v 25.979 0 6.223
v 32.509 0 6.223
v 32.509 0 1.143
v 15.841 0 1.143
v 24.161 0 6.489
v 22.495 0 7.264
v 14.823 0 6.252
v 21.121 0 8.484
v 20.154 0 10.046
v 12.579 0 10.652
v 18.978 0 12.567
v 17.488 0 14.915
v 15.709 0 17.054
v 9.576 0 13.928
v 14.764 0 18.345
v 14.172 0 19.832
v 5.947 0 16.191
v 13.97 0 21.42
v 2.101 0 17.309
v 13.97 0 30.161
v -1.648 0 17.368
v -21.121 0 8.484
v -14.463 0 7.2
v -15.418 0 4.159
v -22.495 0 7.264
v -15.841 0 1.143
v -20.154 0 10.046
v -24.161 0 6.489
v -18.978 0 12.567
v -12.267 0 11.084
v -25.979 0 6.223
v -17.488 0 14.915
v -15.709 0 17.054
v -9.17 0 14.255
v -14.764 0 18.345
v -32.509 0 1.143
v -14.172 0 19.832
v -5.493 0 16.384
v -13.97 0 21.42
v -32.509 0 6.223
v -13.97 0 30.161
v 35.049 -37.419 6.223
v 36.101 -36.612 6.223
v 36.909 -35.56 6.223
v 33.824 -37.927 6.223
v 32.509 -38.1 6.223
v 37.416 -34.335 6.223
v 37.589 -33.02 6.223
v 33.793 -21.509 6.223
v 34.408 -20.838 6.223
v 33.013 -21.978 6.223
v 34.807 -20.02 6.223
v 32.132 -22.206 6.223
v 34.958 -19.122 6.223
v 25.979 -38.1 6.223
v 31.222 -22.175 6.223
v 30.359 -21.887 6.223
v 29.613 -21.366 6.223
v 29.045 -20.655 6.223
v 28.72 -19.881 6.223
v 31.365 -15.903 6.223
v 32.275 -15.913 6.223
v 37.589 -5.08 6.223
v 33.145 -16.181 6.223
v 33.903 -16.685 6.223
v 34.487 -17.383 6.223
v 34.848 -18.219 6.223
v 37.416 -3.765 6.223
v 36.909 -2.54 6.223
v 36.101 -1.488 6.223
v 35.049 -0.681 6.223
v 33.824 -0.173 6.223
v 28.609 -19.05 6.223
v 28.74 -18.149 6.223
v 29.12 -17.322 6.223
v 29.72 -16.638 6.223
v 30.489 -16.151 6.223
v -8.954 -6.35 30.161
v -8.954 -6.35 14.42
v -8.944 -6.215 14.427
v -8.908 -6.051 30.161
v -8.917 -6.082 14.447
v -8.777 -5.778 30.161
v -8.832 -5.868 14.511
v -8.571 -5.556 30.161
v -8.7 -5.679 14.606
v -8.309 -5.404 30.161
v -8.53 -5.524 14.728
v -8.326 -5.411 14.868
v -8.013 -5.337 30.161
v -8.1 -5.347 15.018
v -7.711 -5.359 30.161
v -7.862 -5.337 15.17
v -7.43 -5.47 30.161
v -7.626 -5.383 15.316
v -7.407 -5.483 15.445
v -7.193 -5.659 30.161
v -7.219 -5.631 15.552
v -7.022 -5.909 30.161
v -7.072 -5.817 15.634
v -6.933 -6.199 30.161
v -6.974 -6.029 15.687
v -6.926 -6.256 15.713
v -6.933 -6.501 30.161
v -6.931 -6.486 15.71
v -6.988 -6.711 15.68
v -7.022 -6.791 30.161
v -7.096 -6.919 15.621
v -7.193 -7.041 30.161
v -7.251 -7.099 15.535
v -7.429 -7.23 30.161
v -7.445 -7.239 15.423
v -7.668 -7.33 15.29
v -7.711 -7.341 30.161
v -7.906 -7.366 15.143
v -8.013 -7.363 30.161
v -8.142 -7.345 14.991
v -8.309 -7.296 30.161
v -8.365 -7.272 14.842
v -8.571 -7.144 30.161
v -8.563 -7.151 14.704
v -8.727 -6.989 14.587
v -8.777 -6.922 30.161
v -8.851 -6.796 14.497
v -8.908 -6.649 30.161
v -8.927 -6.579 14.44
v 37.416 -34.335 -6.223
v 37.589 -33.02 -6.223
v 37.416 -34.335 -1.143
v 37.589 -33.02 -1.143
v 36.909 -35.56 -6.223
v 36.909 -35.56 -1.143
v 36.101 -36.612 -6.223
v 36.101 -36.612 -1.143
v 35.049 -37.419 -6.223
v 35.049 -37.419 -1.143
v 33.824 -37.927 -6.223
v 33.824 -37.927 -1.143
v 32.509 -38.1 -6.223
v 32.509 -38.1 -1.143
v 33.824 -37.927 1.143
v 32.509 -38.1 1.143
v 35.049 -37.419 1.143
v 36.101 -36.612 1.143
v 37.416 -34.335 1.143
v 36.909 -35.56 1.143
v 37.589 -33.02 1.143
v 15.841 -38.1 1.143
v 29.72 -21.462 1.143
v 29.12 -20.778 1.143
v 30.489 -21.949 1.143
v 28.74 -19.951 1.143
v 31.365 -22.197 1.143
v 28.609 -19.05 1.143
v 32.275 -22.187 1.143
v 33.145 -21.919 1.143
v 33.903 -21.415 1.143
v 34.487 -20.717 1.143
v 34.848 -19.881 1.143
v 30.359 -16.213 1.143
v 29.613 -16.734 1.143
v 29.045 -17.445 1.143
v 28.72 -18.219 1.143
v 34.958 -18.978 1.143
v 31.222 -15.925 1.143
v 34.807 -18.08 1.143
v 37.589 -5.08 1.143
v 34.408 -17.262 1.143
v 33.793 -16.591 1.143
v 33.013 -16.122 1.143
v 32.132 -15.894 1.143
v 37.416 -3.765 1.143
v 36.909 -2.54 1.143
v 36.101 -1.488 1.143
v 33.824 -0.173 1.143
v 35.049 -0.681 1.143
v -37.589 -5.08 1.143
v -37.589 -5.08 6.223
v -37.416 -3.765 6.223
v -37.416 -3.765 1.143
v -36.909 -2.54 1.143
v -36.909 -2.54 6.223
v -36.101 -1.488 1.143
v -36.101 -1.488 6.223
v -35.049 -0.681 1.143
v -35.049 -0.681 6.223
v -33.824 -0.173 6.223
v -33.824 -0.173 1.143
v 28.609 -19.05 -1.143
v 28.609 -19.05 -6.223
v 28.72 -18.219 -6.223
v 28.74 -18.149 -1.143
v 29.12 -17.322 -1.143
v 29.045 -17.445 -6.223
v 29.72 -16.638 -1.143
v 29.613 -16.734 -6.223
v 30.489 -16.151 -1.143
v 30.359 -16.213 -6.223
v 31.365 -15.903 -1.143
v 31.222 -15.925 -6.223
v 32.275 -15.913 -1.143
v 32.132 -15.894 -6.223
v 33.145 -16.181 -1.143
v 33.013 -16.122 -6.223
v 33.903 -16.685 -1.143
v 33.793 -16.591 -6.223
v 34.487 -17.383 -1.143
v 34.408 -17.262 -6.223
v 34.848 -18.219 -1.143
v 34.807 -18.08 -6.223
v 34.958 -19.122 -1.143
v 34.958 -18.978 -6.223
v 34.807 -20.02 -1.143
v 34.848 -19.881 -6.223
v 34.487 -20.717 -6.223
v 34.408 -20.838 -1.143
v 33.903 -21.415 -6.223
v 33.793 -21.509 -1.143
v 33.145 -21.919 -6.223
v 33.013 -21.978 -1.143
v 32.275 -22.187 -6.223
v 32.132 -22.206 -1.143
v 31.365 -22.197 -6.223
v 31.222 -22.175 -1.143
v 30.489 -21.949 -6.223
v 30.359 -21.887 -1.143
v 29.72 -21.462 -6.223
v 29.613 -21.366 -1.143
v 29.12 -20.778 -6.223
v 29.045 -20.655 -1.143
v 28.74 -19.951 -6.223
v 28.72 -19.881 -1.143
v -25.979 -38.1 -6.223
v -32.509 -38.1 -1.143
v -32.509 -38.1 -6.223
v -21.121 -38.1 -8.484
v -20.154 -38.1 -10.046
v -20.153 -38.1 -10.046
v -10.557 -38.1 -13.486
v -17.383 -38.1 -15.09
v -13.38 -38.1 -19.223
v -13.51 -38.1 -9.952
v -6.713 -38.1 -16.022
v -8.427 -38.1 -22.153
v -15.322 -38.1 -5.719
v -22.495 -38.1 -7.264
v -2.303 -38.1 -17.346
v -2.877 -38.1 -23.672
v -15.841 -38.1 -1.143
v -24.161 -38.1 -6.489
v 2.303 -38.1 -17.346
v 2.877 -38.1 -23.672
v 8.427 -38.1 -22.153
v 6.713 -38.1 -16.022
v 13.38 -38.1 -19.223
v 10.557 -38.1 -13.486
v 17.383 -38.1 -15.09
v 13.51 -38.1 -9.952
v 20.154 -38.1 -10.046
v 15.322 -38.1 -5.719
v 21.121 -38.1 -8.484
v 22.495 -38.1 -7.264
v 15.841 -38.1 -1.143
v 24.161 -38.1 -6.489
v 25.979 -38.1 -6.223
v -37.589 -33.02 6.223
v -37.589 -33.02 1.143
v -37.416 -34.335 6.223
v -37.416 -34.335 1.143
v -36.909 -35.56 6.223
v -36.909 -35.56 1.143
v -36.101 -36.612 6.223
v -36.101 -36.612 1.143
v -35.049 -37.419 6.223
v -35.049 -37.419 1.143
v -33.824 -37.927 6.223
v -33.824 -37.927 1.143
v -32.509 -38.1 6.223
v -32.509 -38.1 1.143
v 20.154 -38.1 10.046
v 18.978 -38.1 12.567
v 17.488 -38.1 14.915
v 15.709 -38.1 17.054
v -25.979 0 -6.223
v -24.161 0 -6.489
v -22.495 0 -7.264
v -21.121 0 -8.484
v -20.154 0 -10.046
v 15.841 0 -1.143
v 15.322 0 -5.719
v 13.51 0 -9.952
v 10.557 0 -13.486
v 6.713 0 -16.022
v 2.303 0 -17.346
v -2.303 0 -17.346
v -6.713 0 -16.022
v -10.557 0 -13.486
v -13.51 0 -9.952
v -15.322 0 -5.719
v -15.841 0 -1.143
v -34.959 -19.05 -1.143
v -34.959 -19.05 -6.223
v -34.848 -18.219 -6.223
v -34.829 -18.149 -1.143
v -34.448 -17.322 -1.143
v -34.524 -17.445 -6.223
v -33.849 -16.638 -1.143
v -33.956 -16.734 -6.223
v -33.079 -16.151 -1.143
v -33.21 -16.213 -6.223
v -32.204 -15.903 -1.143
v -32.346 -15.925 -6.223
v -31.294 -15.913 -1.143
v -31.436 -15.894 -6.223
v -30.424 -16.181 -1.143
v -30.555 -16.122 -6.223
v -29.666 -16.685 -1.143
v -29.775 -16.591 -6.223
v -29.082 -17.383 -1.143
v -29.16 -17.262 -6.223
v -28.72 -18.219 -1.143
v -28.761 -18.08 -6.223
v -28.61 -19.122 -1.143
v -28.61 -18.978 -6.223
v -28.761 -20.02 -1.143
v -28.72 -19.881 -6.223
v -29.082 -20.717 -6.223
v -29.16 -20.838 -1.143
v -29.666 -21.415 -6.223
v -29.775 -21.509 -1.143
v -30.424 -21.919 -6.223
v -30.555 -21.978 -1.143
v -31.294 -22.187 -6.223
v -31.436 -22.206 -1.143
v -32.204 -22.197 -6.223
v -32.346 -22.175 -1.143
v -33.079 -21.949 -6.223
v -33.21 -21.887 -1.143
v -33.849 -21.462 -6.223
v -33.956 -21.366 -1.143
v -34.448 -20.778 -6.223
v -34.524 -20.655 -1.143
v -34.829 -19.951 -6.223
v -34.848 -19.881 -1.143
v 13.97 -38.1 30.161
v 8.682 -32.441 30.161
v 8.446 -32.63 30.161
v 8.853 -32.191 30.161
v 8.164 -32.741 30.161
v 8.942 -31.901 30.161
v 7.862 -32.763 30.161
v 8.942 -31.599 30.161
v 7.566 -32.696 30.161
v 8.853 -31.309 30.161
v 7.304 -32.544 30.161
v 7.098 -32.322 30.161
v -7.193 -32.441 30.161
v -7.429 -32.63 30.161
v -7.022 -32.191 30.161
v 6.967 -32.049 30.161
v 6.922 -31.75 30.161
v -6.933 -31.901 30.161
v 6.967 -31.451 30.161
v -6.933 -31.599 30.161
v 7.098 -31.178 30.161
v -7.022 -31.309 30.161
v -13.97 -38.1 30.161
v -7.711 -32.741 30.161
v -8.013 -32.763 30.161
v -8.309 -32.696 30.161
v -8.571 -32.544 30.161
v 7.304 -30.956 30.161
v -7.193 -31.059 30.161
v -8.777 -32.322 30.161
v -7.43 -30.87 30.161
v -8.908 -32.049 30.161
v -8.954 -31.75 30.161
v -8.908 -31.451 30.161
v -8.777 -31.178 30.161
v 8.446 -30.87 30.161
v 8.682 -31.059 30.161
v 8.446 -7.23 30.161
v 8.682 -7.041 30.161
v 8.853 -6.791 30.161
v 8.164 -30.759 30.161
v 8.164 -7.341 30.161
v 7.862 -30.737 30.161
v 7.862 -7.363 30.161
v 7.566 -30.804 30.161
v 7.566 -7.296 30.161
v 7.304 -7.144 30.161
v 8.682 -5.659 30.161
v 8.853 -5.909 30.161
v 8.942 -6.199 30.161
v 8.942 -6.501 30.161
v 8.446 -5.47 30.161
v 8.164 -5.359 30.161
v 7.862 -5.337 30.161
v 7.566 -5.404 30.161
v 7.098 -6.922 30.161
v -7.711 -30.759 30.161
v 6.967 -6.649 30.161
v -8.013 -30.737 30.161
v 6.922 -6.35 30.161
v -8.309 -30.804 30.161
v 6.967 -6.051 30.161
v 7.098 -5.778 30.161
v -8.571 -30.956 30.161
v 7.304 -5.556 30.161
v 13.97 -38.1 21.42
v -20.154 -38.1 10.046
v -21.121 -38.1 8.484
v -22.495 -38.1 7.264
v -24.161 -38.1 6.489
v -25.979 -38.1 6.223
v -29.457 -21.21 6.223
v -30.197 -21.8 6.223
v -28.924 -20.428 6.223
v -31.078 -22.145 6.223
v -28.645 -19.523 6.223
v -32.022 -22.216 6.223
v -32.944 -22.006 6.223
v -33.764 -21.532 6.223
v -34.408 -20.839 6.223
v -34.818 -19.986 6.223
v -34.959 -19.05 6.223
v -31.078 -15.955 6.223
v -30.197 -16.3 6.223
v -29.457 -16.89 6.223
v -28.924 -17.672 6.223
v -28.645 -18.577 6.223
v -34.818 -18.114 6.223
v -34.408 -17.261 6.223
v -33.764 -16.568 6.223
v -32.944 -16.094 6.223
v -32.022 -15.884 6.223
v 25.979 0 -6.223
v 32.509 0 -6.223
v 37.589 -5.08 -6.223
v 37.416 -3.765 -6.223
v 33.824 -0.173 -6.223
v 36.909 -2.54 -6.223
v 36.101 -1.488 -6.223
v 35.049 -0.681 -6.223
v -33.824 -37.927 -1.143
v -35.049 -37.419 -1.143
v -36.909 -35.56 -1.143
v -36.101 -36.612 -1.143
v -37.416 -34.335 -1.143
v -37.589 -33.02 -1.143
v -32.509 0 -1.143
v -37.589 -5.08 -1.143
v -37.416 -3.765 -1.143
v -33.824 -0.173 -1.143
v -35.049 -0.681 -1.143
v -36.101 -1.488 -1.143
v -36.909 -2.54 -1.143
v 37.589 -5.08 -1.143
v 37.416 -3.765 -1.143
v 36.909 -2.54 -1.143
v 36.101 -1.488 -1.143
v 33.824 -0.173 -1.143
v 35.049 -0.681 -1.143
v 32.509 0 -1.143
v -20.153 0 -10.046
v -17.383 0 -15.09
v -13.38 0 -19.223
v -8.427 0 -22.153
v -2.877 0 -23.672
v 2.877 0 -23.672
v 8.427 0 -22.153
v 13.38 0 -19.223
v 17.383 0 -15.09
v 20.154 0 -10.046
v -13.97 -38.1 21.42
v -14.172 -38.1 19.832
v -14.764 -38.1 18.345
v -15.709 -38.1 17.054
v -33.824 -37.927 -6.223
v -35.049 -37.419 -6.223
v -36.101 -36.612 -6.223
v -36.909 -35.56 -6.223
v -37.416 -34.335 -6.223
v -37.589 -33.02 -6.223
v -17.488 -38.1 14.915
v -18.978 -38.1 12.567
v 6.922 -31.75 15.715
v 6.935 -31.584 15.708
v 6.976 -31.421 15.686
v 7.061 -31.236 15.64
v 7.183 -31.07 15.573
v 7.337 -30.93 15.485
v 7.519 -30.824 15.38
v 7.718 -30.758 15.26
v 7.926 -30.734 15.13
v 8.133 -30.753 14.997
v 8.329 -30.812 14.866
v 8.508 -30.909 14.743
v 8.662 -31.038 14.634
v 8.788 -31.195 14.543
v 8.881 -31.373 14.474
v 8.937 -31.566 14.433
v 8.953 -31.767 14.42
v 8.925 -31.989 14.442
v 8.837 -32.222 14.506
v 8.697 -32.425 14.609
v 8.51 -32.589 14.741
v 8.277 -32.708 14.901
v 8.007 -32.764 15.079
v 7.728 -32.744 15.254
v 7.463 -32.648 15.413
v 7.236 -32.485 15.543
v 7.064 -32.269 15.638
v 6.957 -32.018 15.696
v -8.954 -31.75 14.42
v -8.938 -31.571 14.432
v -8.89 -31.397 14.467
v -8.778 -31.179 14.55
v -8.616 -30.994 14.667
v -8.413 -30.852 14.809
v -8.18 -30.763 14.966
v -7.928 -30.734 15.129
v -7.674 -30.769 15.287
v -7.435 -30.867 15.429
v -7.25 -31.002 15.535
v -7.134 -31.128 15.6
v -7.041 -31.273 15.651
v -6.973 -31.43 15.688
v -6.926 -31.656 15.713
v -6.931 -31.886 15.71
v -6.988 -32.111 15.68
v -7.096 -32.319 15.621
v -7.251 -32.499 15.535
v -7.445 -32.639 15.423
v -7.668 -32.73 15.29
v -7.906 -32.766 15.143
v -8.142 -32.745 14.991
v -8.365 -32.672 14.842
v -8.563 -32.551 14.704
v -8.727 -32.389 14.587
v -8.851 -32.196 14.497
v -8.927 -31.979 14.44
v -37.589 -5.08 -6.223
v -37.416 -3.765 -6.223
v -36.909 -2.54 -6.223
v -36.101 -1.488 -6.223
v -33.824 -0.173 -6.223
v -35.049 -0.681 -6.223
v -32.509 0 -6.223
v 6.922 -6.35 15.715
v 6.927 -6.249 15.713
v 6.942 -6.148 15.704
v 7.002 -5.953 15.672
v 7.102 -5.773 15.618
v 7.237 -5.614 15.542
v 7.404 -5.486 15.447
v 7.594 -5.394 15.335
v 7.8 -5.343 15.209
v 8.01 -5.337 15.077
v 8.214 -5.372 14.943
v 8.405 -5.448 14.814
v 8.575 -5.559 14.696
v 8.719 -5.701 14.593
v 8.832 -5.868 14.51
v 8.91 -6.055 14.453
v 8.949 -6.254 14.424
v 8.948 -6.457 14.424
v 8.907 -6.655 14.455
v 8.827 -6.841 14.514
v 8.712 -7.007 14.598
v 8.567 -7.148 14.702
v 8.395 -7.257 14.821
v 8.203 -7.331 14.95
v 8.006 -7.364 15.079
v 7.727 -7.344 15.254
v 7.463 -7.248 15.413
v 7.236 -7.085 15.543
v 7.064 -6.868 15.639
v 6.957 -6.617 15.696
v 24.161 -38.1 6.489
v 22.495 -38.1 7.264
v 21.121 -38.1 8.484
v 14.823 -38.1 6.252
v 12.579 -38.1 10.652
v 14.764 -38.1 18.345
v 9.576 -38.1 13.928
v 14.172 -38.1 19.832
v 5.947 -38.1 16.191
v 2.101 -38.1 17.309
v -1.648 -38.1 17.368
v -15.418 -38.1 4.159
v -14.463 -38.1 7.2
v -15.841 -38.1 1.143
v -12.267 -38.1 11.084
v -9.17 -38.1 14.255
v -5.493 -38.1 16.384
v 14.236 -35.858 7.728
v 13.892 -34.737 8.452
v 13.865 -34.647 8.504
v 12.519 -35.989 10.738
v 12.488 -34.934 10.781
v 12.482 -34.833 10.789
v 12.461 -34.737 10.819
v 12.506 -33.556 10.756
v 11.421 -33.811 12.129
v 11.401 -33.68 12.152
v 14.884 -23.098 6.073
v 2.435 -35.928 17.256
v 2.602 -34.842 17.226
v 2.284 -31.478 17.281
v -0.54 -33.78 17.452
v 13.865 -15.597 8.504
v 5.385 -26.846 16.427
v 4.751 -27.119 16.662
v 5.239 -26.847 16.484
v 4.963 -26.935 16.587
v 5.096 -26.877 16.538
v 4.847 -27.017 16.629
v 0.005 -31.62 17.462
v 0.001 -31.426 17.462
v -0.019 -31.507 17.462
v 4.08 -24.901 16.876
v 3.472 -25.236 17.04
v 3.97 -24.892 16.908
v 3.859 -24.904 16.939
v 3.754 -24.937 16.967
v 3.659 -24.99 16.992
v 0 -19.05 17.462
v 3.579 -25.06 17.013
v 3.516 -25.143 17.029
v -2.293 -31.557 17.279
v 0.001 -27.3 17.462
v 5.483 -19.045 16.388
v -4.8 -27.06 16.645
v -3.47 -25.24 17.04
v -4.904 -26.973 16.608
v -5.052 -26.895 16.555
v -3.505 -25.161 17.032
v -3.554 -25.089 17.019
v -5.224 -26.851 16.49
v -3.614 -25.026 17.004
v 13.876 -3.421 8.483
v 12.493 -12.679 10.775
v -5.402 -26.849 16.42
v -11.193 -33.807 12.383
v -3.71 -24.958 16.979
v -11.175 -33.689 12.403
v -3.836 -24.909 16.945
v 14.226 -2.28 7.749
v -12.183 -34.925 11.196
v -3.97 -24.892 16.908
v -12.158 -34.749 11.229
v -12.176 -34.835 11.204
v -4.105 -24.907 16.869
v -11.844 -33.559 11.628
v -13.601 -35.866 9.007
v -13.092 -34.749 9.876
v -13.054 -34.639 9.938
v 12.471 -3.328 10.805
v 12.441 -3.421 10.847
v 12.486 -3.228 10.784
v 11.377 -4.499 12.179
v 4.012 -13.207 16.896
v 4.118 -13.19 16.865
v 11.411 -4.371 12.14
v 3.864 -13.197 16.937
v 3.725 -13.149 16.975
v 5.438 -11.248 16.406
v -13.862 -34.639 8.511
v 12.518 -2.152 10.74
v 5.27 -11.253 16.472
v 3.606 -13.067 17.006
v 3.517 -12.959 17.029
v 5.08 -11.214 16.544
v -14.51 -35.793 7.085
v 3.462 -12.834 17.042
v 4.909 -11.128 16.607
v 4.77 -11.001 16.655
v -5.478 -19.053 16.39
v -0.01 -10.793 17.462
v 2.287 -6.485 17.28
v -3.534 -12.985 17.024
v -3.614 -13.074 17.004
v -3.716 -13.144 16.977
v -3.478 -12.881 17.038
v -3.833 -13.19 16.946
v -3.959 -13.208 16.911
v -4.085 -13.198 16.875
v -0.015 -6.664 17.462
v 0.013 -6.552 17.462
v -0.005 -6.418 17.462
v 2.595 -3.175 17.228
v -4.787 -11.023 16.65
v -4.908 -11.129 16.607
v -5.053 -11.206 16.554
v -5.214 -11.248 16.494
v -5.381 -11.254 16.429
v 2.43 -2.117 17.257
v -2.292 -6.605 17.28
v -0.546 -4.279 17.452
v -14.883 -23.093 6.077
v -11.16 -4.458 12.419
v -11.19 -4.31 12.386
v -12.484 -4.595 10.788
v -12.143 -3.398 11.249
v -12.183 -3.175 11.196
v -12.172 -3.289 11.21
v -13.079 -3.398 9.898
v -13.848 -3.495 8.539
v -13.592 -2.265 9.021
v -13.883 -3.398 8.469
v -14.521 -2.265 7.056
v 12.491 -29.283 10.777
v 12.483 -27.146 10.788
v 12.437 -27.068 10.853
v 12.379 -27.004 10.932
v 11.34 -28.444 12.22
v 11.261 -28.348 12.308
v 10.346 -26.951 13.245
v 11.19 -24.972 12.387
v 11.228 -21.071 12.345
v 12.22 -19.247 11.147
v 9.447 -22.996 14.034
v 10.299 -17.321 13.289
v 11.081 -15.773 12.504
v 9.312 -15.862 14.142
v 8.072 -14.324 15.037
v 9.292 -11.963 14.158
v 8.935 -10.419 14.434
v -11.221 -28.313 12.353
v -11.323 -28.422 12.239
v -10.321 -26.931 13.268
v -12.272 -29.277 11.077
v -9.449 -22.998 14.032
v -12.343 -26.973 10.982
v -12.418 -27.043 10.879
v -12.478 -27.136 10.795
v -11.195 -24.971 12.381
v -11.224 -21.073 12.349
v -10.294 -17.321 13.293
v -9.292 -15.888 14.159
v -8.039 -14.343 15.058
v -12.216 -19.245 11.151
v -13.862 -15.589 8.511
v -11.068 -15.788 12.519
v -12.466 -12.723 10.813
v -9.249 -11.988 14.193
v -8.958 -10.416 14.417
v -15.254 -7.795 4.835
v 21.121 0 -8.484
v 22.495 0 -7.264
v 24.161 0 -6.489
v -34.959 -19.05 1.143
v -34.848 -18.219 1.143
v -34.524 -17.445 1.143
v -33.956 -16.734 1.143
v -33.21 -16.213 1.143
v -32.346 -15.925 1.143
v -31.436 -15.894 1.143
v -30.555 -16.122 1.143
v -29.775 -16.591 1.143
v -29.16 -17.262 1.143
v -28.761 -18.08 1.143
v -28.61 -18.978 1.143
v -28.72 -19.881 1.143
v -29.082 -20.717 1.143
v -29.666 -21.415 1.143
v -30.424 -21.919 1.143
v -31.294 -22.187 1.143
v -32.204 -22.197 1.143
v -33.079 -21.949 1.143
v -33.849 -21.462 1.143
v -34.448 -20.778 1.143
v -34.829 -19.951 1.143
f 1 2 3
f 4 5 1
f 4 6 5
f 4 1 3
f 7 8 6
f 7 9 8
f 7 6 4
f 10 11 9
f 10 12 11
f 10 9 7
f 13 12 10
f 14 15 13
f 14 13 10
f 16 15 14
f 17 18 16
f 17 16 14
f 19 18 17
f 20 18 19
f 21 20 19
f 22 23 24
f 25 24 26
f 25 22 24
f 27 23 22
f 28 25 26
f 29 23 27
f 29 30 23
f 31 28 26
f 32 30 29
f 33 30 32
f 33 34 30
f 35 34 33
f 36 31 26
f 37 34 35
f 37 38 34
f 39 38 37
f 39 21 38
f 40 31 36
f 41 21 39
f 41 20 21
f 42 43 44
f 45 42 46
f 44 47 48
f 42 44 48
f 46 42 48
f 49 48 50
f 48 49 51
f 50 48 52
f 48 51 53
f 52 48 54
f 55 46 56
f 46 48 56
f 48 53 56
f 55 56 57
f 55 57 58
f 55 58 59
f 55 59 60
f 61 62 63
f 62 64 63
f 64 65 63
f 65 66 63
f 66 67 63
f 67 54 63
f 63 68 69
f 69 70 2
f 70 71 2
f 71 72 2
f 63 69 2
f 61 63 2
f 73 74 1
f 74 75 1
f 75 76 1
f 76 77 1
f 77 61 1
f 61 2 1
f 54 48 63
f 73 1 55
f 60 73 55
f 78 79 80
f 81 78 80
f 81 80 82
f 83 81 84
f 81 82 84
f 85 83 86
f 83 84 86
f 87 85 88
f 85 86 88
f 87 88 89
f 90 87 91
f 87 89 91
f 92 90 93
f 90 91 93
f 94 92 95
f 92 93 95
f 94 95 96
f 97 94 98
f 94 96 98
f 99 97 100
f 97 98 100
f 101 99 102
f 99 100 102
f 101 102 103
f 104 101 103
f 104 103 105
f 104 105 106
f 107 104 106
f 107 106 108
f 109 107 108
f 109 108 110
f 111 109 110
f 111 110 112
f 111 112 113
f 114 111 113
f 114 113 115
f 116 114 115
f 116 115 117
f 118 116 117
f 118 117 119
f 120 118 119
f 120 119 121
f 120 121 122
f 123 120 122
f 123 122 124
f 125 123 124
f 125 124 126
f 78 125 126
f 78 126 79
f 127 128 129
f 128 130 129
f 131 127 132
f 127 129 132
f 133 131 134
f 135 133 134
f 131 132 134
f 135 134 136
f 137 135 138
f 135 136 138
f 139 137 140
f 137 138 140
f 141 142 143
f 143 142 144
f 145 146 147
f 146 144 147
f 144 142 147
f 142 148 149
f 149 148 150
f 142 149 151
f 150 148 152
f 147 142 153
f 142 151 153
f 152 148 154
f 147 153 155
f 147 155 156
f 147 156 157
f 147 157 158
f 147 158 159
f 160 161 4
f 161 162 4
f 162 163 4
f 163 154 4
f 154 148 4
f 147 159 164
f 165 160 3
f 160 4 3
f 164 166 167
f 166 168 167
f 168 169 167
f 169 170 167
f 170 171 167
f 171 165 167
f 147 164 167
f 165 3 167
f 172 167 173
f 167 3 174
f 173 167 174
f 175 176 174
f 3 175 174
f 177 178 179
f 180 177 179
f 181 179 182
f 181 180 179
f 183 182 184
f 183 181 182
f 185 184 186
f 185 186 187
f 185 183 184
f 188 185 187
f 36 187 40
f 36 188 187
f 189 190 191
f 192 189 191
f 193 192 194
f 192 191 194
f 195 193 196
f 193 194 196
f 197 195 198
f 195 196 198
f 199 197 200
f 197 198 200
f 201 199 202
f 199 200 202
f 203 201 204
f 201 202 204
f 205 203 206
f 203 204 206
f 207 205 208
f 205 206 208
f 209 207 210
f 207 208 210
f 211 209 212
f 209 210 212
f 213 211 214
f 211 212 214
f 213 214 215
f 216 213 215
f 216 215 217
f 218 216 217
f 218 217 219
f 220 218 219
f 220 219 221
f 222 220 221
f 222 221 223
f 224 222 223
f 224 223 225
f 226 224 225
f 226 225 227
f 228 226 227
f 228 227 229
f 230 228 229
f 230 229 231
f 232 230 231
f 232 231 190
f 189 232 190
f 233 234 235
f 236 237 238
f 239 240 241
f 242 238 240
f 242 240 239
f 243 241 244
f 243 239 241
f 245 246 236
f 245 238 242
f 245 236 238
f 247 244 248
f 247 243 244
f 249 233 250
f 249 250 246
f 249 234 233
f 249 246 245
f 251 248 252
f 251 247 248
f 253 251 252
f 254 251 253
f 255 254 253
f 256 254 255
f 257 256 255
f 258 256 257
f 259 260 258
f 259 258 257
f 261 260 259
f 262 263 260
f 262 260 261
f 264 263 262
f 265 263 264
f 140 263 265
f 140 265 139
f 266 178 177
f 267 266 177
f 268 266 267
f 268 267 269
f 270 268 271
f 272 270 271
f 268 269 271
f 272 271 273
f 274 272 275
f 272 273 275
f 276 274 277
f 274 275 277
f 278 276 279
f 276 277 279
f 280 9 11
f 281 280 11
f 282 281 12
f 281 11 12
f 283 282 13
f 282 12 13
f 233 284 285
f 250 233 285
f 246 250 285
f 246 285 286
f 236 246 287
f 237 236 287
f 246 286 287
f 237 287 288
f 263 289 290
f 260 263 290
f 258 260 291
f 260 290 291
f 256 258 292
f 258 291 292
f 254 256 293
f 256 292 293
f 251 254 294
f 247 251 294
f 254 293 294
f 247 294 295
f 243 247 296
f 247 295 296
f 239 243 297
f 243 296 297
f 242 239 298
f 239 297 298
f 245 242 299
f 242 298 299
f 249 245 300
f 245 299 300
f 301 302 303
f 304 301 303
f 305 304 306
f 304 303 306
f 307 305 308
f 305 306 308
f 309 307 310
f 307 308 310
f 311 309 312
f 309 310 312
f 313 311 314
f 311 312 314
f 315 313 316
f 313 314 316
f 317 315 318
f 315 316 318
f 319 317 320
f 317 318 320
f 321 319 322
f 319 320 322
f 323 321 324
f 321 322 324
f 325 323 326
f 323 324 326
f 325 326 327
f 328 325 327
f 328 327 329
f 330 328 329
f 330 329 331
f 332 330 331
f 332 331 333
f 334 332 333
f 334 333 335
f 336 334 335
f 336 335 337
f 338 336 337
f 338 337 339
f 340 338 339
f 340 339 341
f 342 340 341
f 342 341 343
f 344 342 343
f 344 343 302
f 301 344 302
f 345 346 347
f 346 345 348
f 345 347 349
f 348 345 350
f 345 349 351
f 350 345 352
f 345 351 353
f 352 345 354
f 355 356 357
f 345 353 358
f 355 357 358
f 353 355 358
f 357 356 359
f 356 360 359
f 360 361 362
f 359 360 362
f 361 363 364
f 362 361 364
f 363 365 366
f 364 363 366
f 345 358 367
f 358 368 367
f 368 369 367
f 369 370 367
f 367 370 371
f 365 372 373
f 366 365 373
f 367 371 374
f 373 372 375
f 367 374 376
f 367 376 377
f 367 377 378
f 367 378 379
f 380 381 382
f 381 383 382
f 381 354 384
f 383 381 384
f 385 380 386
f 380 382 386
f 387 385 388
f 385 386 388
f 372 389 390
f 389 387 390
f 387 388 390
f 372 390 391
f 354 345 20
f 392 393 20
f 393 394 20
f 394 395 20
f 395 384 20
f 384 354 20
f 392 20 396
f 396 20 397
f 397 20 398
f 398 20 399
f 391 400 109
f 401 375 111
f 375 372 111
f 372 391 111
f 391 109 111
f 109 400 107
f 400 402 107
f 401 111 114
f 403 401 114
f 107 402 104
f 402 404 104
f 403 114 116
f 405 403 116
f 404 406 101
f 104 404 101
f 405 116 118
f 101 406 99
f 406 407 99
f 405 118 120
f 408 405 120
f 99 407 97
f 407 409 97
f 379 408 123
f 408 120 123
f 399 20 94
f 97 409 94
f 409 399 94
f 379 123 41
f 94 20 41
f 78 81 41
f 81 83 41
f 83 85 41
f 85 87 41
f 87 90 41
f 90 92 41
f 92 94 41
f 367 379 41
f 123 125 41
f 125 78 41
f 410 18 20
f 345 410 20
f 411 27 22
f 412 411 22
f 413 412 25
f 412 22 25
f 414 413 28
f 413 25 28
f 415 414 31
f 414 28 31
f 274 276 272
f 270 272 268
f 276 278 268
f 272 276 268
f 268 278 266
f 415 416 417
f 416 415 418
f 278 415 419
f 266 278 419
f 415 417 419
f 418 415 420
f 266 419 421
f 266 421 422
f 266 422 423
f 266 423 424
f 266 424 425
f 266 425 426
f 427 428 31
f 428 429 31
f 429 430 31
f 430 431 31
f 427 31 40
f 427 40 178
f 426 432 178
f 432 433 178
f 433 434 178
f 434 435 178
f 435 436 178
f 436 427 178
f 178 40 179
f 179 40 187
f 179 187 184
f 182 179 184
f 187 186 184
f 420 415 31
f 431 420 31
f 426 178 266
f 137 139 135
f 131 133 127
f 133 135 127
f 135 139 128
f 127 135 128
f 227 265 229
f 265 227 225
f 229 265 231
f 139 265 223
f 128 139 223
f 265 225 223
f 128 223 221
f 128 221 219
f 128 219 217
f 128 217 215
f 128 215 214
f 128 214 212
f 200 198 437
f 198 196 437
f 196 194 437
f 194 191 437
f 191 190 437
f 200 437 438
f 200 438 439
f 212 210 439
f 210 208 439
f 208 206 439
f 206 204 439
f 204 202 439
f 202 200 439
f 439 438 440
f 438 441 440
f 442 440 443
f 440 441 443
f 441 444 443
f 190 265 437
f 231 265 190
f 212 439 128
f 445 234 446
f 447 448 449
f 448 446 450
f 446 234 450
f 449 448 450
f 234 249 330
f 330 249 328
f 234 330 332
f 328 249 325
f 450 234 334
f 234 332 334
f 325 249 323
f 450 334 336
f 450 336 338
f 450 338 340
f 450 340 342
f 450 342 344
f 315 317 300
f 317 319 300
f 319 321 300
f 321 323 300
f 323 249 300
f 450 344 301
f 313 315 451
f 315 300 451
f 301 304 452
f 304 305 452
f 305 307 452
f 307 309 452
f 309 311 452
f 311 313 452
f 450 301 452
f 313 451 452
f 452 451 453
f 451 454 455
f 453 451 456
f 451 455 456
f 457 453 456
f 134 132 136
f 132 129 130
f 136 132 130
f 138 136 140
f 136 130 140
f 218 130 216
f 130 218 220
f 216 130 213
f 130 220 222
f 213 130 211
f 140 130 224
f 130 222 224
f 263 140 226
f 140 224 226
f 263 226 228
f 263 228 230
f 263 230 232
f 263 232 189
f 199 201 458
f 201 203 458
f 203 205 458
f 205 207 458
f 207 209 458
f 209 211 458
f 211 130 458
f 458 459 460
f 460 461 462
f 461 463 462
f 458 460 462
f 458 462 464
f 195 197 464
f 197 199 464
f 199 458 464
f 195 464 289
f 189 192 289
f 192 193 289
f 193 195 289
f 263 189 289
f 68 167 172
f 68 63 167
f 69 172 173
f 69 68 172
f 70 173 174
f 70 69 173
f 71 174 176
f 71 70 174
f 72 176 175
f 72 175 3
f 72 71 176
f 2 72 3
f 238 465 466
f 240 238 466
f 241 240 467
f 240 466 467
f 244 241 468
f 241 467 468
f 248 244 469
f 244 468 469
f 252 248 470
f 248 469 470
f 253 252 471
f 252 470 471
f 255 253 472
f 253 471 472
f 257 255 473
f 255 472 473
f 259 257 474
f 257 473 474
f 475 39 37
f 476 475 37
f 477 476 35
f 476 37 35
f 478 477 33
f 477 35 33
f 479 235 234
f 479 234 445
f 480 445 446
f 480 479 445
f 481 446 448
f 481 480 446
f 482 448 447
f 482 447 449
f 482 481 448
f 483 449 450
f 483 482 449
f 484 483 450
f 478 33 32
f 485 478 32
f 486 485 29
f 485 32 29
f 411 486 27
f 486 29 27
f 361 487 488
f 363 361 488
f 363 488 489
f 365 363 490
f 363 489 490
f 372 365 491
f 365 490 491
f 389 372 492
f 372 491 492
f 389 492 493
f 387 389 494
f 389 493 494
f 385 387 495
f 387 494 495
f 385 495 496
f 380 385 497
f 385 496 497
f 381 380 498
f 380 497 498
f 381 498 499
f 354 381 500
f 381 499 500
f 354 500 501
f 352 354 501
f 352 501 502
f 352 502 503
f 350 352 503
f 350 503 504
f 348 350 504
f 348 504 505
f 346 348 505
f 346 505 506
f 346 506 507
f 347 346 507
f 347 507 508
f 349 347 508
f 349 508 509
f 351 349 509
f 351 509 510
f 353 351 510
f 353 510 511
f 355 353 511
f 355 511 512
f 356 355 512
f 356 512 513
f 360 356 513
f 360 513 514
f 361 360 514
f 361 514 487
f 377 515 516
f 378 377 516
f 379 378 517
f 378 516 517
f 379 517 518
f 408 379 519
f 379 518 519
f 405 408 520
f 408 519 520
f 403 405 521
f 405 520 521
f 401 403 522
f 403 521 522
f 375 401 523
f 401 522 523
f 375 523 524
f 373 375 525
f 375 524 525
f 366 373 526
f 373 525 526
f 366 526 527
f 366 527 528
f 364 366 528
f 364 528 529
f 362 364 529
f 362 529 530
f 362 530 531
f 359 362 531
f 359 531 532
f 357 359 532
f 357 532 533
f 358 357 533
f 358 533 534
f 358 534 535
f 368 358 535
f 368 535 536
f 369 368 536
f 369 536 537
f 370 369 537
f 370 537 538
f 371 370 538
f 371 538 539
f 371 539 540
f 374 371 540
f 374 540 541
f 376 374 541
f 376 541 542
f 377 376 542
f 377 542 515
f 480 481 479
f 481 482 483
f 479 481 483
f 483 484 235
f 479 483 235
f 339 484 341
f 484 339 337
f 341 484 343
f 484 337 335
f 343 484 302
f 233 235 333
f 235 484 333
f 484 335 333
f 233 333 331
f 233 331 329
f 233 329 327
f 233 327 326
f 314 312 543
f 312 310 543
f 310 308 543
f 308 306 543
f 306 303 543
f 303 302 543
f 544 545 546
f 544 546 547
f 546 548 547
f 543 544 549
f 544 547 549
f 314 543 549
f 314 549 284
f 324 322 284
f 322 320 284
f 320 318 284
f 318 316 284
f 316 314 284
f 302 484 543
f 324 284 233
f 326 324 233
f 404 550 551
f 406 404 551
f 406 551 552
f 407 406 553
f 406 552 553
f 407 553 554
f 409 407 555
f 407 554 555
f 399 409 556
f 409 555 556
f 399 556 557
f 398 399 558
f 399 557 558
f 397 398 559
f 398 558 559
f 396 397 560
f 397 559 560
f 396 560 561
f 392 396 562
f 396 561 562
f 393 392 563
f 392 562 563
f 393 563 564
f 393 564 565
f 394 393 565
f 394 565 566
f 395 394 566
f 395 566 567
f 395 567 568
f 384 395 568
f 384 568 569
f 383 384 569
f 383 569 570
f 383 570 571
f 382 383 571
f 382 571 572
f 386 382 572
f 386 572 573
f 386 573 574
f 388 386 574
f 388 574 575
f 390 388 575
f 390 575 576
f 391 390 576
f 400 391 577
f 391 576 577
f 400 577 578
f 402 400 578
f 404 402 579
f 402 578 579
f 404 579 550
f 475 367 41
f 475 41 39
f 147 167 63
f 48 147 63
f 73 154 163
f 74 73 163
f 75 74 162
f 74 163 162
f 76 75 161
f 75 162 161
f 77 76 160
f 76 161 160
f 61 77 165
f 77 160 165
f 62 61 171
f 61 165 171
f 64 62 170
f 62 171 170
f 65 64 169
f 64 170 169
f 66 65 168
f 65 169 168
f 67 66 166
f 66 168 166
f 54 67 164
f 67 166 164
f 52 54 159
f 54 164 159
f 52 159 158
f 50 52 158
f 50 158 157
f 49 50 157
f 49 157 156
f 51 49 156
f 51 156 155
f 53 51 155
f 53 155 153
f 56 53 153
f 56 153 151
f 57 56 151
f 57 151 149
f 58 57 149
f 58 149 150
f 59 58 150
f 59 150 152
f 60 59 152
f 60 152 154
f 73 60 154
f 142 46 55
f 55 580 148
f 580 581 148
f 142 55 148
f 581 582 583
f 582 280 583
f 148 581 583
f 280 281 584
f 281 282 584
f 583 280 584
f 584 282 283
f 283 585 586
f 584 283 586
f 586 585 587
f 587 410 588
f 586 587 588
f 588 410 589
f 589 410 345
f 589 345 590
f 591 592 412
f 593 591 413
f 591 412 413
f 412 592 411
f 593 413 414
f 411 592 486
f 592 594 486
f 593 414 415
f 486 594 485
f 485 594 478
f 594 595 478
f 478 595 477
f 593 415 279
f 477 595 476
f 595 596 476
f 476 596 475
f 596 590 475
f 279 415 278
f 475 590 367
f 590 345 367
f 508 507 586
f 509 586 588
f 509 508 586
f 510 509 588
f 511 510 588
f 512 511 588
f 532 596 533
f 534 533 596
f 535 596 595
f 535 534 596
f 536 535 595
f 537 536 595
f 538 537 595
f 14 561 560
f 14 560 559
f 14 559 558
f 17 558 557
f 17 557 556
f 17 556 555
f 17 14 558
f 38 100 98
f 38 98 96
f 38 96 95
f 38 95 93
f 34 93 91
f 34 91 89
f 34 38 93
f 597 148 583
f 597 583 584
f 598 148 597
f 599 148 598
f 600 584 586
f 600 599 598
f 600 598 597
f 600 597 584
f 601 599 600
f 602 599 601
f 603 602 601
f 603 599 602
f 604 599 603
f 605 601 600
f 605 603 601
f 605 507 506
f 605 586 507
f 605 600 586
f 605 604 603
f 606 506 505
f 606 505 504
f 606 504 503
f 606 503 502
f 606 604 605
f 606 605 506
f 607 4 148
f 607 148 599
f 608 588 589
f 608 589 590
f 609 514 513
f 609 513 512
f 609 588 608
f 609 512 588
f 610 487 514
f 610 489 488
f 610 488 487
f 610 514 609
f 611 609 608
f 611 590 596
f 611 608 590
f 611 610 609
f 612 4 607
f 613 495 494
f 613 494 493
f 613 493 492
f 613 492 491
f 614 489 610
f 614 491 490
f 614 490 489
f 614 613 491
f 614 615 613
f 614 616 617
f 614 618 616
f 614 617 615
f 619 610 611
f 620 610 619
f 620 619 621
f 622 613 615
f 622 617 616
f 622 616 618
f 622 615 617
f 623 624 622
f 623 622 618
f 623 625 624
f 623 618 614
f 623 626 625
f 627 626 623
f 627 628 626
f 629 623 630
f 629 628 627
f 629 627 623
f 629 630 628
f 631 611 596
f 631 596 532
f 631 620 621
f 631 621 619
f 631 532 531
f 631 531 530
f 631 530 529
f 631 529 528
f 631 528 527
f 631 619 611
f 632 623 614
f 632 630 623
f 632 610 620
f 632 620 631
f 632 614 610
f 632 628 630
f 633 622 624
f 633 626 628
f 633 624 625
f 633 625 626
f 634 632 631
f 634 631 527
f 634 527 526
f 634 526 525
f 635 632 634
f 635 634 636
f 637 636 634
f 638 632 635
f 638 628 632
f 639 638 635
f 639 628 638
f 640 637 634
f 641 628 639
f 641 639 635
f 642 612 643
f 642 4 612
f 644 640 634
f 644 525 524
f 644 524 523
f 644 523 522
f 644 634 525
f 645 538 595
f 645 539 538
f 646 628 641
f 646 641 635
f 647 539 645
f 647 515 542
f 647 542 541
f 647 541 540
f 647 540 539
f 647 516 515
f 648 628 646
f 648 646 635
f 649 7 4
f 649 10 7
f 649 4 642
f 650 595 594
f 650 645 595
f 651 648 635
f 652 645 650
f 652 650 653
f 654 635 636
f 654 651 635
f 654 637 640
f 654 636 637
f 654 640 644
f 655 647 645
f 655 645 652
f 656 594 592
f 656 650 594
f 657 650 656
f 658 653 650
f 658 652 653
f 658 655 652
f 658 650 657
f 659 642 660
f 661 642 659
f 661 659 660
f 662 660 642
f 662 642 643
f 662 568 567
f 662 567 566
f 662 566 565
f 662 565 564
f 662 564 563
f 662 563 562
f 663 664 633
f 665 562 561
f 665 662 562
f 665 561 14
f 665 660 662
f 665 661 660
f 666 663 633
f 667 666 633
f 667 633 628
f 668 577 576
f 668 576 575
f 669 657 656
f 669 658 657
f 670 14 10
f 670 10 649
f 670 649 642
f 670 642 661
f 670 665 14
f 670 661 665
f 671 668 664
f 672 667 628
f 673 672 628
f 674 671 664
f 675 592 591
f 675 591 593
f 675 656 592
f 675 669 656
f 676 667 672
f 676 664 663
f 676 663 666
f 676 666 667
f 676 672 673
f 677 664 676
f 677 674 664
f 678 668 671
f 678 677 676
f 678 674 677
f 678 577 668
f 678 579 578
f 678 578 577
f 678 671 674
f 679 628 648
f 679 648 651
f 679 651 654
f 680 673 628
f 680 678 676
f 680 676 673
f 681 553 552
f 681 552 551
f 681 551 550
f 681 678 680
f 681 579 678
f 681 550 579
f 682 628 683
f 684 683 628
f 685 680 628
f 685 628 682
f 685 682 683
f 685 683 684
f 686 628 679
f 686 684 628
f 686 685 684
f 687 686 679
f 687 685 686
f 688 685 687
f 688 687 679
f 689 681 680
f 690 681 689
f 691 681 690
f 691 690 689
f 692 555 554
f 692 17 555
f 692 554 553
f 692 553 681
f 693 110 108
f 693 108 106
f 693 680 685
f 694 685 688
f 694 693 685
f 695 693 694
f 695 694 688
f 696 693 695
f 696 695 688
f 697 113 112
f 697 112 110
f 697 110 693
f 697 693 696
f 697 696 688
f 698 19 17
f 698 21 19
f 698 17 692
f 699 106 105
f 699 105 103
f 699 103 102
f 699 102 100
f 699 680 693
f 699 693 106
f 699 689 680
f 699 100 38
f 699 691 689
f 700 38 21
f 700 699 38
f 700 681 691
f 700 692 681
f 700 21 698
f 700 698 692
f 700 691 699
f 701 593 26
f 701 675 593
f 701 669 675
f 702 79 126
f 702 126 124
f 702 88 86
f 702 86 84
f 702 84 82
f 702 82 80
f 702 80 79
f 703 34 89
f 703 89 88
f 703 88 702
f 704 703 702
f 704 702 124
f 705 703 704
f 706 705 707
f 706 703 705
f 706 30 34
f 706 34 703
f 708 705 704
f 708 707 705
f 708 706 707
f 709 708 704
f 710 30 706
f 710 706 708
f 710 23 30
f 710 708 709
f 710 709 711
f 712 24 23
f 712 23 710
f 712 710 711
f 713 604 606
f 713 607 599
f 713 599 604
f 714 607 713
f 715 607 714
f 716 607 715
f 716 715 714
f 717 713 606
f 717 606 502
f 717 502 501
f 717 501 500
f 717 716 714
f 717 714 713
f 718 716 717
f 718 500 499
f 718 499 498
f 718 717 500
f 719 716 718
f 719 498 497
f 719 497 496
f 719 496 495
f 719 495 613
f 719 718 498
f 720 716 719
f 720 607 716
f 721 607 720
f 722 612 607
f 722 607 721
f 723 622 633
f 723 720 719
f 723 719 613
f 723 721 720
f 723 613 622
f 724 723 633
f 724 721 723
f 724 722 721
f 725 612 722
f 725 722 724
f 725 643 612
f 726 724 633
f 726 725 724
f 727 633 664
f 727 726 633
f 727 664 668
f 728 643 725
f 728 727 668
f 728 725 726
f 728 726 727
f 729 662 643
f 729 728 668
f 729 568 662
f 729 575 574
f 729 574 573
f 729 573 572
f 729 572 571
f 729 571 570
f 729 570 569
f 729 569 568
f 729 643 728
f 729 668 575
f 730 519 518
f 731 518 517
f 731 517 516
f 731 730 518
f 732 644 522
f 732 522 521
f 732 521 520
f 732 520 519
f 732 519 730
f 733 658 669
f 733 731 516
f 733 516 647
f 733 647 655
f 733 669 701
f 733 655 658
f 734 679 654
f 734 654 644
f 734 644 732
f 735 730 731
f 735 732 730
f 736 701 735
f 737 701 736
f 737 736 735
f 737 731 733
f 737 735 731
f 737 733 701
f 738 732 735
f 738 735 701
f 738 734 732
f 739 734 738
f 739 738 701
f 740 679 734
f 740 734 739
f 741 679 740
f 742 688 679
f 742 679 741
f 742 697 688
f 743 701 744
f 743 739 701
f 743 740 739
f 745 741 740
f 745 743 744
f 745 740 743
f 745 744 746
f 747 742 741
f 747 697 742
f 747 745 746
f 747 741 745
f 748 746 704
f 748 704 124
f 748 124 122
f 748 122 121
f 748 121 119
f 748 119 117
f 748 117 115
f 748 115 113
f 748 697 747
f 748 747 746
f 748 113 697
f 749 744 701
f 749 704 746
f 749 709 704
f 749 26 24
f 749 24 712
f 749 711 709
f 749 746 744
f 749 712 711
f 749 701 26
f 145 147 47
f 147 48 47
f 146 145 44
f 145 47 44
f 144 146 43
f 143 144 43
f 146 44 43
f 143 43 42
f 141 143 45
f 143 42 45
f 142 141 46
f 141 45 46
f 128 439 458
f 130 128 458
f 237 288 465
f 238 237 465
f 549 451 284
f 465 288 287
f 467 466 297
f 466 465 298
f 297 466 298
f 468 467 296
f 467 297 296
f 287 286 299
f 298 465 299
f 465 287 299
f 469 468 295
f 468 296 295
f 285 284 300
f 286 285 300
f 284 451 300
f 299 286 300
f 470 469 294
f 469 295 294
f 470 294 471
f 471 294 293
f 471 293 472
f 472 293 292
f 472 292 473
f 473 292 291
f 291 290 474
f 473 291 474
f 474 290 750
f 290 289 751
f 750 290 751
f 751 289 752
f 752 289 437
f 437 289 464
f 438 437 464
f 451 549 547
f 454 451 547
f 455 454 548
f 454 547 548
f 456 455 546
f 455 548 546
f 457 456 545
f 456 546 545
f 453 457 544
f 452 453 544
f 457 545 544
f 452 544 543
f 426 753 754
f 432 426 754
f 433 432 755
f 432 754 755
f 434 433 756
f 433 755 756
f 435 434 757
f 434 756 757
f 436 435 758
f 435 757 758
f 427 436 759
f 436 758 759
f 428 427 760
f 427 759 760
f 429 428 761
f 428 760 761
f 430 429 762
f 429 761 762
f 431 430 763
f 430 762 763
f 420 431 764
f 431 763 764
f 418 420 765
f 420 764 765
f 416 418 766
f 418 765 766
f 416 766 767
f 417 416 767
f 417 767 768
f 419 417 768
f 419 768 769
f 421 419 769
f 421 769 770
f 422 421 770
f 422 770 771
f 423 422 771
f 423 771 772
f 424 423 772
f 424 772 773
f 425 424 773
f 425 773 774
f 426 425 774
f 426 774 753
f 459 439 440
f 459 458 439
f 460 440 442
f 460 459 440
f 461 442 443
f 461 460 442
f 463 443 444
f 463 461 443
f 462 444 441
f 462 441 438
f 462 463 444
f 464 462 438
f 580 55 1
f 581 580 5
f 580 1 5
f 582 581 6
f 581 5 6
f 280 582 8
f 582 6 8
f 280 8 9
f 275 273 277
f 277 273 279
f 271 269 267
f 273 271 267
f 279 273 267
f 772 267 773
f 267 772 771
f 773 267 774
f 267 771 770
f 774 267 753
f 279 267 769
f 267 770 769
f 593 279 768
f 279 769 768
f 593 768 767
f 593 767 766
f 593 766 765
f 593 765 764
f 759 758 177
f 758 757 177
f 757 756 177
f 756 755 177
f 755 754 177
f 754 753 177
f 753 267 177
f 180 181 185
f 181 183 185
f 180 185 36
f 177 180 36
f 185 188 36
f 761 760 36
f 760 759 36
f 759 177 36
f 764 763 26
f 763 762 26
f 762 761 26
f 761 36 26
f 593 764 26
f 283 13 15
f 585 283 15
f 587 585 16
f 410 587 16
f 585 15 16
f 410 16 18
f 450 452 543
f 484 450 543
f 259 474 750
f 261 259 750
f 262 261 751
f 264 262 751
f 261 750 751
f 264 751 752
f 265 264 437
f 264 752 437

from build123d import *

# Parameters (mm, degrees)
F1_DEPTH   = 38.1
F3_D       = 6.35
F3_DEPTH   = 12.7
F3_TIP     = 1.9077324654
F3_2_D     = 6.35
F3_2_DEPTH = 12.7
F3_2_TIP   = 1.9077324654
F5_D       = 2.032
F5_DEPTH   = 25.4
F5_TIP     = 0.6104743889
F6_R       = 5.08
F6_2_R     = 5.08


with BuildPart() as f1:
    # F0 (on Front) → F1 (new body)
    with BuildSketch(Plane.XZ):
        with BuildLine():
            add(Edge.make_bspline(
                [(15.8409553423, 1.1430258969), (14.8677701559, 17.4625), (0, 17.4625), (-14.8677701559, 17.4625), (-15.8409553423, 1.1430258969)],
                knots=[1.6362991866, 1.6362991866, 1.6362991866, 3.1415926536, 3.1415926536, 4.6468861206, 4.6468861206, 4.6468861206], degree=2, weights=[1, 0.729882192, 1, 0.729882192, 1]))
            Line((15.8409553423, 1.1430258969), (37.5891549855, 1.1430258969))
            Line((37.5891549855, 1.1430258969), (37.5891549855, 6.2230258973))
            Line((37.5891549855, 6.2230258973), (25.9791738172, 6.2230258973))
            ThreePointArc((25.9791738172, 6.2230258973), (22.4950983779, 7.2641919074), (20.1535429146, 10.0462642176))
            ThreePointArc((20.1535429146, 10.0462642176), (18.2705029961, 13.7649454006), (15.7093012107, 17.0535126403))
            ThreePointArc((15.7093012107, 17.0535126403), (14.4208290036, 19.0697882678), (13.9700000244, 21.4197417283))
            Line((13.9700000244, 21.4197417283), (13.9700000244, 30.1608613677))
            Line((13.9700000244, 30.1608613677), (-13.9700000243, 30.1608613677))
            Line((-13.9700000243, 30.1608613677), (-13.9700000243, 21.419741954))
            ThreePointArc((-13.9700000243, 21.419741954), (-14.4208290165, 19.0697884608), (-15.7093012591, 17.0535128148))
            ThreePointArc((-15.7093012591, 17.0535128148), (-18.2705045645, 13.7649432645), (-20.1535450557, 10.0462592811))
            ThreePointArc((-20.1535450557, 10.0462592811), (-22.4951019105, 7.2641851476), (-25.9791799057, 6.2230196887))
            Line((-25.9791799057, 6.2230196887), (-37.5893437065, 6.2230258969))
            Line((-37.5893437065, 6.2230258969), (-37.5893437065, 1.1430258969))
            Line((-37.5893437065, 1.1430258969), (-15.8409553423, 1.1430258969))
        make_face()
    extrude(amount=F1_DEPTH)

    # F3
    with Locations(Plane(origin=(3.3276e-06, 0, 6.2230057969), x_dir=(1, 0, -5.347e-07), z_dir=(5.347e-07, 0, 1))):
        with Locations((-31.7842651337, -19.05), (31.7841610737, -19.05)):
            Hole(F3_D / 2, depth=F3_DEPTH)
            with Locations((0, 0, -(F3_DEPTH + F3_TIP / 2))):  # 118° drill point
                Cone(0, F3_D / 2, F3_TIP, mode=Mode.SUBTRACT)

    # F5
    with Locations(Plane.XY.offset(30.1608613677)):
        with Locations((-7.9375, -6.35), (7.9375, -6.35), (7.9375, -31.75), (-7.9375, -31.75)):
            Hole(F5_D / 2, depth=F5_DEPTH)
            with Locations((0, 0, -(F5_DEPTH + F5_TIP / 2))):  # 118° drill point
                Cone(0, F5_D / 2, F5_TIP, mode=Mode.SUBTRACT)

    # F6#2
    f6_2_edges = [f1.edges().sort_by_distance(p)[0] for p in [
        (37.589155, 0, 3.683026),
        (-37.589344, 0, 3.683026),
        (-37.589344, -38.1, 3.683026),
        (37.589155, -38.1, 3.683026),
    ]]
    fillet(f6_2_edges, radius=F6_2_R)


with BuildPart() as f1b:
    # F0 (on Front) → F1, piece 2 (new body)
    with BuildSketch(Plane.XZ):
        with BuildLine():
            Line((37.5891549855, -6.2230258973), (37.5891549855, -1.1430258969))
            Line((37.5891549855, -1.1430258969), (15.8409553423, -1.1430258969))
            ThreePointArc((15.8409553423, -1.1430258969), (0, -17.5142655313), (-15.8409553423, -1.1430258969))
            Line((-15.8409553423, -1.1430258969), (-37.5893437065, -1.1430258969))
            Line((-37.5893437065, -1.1430258969), (-37.5893437065, -6.2230258969))
            Line((-37.5893437065, -6.2230258969), (-25.9791799057, -6.2230196887))
            ThreePointArc((-25.9791799057, -6.2230196885), (-22.4951019106, -7.2641851474), (-20.1535450558, -10.0462592809))
            Line((-20.1535450558, -10.0462592809), (-20.153436098, -10.0462592809))
            ThreePointArc((-20.153436098, -10.0462592809), (5.17161e-05, -23.8642655314), (20.1535429148, -10.0462642172))
            ThreePointArc((20.1535429148, -10.0462642172), (22.4950983781, -7.264191907), (25.9791738174, -6.223025897))
            Line((25.9791738172, -6.2230258973), (37.5891549855, -6.2230258973))
        make_face()
    extrude(amount=F1_DEPTH)

    # F3#2
    with Locations(Plane(origin=(3.3276e-06, 0, 6.2230057969), x_dir=(1, 0, -5.347e-07), z_dir=(5.347e-07, 0, 1))):
        with Locations((-31.7842651337, -19.05), (31.7841610737, -19.05)):
            Hole(F3_2_D / 2, depth=F3_2_DEPTH)
            with Locations((0, 0, -(F3_2_DEPTH + F3_2_TIP / 2))):  # 118° drill point
                Cone(0, F3_2_D / 2, F3_2_TIP, mode=Mode.SUBTRACT)

    # F6
    f6_edges = [f1b.edges().sort_by_distance(p)[0] for p in [
        (-37.589344, 0, -3.683026),
        (37.589155, 0, -3.683026),
        (-37.589344, -38.1, -3.683026),
        (37.589155, -38.1, -3.683026),
    ]]
    fillet(f6_edges, radius=F6_R)


solid = Compound([f1.part, f1b.part])
